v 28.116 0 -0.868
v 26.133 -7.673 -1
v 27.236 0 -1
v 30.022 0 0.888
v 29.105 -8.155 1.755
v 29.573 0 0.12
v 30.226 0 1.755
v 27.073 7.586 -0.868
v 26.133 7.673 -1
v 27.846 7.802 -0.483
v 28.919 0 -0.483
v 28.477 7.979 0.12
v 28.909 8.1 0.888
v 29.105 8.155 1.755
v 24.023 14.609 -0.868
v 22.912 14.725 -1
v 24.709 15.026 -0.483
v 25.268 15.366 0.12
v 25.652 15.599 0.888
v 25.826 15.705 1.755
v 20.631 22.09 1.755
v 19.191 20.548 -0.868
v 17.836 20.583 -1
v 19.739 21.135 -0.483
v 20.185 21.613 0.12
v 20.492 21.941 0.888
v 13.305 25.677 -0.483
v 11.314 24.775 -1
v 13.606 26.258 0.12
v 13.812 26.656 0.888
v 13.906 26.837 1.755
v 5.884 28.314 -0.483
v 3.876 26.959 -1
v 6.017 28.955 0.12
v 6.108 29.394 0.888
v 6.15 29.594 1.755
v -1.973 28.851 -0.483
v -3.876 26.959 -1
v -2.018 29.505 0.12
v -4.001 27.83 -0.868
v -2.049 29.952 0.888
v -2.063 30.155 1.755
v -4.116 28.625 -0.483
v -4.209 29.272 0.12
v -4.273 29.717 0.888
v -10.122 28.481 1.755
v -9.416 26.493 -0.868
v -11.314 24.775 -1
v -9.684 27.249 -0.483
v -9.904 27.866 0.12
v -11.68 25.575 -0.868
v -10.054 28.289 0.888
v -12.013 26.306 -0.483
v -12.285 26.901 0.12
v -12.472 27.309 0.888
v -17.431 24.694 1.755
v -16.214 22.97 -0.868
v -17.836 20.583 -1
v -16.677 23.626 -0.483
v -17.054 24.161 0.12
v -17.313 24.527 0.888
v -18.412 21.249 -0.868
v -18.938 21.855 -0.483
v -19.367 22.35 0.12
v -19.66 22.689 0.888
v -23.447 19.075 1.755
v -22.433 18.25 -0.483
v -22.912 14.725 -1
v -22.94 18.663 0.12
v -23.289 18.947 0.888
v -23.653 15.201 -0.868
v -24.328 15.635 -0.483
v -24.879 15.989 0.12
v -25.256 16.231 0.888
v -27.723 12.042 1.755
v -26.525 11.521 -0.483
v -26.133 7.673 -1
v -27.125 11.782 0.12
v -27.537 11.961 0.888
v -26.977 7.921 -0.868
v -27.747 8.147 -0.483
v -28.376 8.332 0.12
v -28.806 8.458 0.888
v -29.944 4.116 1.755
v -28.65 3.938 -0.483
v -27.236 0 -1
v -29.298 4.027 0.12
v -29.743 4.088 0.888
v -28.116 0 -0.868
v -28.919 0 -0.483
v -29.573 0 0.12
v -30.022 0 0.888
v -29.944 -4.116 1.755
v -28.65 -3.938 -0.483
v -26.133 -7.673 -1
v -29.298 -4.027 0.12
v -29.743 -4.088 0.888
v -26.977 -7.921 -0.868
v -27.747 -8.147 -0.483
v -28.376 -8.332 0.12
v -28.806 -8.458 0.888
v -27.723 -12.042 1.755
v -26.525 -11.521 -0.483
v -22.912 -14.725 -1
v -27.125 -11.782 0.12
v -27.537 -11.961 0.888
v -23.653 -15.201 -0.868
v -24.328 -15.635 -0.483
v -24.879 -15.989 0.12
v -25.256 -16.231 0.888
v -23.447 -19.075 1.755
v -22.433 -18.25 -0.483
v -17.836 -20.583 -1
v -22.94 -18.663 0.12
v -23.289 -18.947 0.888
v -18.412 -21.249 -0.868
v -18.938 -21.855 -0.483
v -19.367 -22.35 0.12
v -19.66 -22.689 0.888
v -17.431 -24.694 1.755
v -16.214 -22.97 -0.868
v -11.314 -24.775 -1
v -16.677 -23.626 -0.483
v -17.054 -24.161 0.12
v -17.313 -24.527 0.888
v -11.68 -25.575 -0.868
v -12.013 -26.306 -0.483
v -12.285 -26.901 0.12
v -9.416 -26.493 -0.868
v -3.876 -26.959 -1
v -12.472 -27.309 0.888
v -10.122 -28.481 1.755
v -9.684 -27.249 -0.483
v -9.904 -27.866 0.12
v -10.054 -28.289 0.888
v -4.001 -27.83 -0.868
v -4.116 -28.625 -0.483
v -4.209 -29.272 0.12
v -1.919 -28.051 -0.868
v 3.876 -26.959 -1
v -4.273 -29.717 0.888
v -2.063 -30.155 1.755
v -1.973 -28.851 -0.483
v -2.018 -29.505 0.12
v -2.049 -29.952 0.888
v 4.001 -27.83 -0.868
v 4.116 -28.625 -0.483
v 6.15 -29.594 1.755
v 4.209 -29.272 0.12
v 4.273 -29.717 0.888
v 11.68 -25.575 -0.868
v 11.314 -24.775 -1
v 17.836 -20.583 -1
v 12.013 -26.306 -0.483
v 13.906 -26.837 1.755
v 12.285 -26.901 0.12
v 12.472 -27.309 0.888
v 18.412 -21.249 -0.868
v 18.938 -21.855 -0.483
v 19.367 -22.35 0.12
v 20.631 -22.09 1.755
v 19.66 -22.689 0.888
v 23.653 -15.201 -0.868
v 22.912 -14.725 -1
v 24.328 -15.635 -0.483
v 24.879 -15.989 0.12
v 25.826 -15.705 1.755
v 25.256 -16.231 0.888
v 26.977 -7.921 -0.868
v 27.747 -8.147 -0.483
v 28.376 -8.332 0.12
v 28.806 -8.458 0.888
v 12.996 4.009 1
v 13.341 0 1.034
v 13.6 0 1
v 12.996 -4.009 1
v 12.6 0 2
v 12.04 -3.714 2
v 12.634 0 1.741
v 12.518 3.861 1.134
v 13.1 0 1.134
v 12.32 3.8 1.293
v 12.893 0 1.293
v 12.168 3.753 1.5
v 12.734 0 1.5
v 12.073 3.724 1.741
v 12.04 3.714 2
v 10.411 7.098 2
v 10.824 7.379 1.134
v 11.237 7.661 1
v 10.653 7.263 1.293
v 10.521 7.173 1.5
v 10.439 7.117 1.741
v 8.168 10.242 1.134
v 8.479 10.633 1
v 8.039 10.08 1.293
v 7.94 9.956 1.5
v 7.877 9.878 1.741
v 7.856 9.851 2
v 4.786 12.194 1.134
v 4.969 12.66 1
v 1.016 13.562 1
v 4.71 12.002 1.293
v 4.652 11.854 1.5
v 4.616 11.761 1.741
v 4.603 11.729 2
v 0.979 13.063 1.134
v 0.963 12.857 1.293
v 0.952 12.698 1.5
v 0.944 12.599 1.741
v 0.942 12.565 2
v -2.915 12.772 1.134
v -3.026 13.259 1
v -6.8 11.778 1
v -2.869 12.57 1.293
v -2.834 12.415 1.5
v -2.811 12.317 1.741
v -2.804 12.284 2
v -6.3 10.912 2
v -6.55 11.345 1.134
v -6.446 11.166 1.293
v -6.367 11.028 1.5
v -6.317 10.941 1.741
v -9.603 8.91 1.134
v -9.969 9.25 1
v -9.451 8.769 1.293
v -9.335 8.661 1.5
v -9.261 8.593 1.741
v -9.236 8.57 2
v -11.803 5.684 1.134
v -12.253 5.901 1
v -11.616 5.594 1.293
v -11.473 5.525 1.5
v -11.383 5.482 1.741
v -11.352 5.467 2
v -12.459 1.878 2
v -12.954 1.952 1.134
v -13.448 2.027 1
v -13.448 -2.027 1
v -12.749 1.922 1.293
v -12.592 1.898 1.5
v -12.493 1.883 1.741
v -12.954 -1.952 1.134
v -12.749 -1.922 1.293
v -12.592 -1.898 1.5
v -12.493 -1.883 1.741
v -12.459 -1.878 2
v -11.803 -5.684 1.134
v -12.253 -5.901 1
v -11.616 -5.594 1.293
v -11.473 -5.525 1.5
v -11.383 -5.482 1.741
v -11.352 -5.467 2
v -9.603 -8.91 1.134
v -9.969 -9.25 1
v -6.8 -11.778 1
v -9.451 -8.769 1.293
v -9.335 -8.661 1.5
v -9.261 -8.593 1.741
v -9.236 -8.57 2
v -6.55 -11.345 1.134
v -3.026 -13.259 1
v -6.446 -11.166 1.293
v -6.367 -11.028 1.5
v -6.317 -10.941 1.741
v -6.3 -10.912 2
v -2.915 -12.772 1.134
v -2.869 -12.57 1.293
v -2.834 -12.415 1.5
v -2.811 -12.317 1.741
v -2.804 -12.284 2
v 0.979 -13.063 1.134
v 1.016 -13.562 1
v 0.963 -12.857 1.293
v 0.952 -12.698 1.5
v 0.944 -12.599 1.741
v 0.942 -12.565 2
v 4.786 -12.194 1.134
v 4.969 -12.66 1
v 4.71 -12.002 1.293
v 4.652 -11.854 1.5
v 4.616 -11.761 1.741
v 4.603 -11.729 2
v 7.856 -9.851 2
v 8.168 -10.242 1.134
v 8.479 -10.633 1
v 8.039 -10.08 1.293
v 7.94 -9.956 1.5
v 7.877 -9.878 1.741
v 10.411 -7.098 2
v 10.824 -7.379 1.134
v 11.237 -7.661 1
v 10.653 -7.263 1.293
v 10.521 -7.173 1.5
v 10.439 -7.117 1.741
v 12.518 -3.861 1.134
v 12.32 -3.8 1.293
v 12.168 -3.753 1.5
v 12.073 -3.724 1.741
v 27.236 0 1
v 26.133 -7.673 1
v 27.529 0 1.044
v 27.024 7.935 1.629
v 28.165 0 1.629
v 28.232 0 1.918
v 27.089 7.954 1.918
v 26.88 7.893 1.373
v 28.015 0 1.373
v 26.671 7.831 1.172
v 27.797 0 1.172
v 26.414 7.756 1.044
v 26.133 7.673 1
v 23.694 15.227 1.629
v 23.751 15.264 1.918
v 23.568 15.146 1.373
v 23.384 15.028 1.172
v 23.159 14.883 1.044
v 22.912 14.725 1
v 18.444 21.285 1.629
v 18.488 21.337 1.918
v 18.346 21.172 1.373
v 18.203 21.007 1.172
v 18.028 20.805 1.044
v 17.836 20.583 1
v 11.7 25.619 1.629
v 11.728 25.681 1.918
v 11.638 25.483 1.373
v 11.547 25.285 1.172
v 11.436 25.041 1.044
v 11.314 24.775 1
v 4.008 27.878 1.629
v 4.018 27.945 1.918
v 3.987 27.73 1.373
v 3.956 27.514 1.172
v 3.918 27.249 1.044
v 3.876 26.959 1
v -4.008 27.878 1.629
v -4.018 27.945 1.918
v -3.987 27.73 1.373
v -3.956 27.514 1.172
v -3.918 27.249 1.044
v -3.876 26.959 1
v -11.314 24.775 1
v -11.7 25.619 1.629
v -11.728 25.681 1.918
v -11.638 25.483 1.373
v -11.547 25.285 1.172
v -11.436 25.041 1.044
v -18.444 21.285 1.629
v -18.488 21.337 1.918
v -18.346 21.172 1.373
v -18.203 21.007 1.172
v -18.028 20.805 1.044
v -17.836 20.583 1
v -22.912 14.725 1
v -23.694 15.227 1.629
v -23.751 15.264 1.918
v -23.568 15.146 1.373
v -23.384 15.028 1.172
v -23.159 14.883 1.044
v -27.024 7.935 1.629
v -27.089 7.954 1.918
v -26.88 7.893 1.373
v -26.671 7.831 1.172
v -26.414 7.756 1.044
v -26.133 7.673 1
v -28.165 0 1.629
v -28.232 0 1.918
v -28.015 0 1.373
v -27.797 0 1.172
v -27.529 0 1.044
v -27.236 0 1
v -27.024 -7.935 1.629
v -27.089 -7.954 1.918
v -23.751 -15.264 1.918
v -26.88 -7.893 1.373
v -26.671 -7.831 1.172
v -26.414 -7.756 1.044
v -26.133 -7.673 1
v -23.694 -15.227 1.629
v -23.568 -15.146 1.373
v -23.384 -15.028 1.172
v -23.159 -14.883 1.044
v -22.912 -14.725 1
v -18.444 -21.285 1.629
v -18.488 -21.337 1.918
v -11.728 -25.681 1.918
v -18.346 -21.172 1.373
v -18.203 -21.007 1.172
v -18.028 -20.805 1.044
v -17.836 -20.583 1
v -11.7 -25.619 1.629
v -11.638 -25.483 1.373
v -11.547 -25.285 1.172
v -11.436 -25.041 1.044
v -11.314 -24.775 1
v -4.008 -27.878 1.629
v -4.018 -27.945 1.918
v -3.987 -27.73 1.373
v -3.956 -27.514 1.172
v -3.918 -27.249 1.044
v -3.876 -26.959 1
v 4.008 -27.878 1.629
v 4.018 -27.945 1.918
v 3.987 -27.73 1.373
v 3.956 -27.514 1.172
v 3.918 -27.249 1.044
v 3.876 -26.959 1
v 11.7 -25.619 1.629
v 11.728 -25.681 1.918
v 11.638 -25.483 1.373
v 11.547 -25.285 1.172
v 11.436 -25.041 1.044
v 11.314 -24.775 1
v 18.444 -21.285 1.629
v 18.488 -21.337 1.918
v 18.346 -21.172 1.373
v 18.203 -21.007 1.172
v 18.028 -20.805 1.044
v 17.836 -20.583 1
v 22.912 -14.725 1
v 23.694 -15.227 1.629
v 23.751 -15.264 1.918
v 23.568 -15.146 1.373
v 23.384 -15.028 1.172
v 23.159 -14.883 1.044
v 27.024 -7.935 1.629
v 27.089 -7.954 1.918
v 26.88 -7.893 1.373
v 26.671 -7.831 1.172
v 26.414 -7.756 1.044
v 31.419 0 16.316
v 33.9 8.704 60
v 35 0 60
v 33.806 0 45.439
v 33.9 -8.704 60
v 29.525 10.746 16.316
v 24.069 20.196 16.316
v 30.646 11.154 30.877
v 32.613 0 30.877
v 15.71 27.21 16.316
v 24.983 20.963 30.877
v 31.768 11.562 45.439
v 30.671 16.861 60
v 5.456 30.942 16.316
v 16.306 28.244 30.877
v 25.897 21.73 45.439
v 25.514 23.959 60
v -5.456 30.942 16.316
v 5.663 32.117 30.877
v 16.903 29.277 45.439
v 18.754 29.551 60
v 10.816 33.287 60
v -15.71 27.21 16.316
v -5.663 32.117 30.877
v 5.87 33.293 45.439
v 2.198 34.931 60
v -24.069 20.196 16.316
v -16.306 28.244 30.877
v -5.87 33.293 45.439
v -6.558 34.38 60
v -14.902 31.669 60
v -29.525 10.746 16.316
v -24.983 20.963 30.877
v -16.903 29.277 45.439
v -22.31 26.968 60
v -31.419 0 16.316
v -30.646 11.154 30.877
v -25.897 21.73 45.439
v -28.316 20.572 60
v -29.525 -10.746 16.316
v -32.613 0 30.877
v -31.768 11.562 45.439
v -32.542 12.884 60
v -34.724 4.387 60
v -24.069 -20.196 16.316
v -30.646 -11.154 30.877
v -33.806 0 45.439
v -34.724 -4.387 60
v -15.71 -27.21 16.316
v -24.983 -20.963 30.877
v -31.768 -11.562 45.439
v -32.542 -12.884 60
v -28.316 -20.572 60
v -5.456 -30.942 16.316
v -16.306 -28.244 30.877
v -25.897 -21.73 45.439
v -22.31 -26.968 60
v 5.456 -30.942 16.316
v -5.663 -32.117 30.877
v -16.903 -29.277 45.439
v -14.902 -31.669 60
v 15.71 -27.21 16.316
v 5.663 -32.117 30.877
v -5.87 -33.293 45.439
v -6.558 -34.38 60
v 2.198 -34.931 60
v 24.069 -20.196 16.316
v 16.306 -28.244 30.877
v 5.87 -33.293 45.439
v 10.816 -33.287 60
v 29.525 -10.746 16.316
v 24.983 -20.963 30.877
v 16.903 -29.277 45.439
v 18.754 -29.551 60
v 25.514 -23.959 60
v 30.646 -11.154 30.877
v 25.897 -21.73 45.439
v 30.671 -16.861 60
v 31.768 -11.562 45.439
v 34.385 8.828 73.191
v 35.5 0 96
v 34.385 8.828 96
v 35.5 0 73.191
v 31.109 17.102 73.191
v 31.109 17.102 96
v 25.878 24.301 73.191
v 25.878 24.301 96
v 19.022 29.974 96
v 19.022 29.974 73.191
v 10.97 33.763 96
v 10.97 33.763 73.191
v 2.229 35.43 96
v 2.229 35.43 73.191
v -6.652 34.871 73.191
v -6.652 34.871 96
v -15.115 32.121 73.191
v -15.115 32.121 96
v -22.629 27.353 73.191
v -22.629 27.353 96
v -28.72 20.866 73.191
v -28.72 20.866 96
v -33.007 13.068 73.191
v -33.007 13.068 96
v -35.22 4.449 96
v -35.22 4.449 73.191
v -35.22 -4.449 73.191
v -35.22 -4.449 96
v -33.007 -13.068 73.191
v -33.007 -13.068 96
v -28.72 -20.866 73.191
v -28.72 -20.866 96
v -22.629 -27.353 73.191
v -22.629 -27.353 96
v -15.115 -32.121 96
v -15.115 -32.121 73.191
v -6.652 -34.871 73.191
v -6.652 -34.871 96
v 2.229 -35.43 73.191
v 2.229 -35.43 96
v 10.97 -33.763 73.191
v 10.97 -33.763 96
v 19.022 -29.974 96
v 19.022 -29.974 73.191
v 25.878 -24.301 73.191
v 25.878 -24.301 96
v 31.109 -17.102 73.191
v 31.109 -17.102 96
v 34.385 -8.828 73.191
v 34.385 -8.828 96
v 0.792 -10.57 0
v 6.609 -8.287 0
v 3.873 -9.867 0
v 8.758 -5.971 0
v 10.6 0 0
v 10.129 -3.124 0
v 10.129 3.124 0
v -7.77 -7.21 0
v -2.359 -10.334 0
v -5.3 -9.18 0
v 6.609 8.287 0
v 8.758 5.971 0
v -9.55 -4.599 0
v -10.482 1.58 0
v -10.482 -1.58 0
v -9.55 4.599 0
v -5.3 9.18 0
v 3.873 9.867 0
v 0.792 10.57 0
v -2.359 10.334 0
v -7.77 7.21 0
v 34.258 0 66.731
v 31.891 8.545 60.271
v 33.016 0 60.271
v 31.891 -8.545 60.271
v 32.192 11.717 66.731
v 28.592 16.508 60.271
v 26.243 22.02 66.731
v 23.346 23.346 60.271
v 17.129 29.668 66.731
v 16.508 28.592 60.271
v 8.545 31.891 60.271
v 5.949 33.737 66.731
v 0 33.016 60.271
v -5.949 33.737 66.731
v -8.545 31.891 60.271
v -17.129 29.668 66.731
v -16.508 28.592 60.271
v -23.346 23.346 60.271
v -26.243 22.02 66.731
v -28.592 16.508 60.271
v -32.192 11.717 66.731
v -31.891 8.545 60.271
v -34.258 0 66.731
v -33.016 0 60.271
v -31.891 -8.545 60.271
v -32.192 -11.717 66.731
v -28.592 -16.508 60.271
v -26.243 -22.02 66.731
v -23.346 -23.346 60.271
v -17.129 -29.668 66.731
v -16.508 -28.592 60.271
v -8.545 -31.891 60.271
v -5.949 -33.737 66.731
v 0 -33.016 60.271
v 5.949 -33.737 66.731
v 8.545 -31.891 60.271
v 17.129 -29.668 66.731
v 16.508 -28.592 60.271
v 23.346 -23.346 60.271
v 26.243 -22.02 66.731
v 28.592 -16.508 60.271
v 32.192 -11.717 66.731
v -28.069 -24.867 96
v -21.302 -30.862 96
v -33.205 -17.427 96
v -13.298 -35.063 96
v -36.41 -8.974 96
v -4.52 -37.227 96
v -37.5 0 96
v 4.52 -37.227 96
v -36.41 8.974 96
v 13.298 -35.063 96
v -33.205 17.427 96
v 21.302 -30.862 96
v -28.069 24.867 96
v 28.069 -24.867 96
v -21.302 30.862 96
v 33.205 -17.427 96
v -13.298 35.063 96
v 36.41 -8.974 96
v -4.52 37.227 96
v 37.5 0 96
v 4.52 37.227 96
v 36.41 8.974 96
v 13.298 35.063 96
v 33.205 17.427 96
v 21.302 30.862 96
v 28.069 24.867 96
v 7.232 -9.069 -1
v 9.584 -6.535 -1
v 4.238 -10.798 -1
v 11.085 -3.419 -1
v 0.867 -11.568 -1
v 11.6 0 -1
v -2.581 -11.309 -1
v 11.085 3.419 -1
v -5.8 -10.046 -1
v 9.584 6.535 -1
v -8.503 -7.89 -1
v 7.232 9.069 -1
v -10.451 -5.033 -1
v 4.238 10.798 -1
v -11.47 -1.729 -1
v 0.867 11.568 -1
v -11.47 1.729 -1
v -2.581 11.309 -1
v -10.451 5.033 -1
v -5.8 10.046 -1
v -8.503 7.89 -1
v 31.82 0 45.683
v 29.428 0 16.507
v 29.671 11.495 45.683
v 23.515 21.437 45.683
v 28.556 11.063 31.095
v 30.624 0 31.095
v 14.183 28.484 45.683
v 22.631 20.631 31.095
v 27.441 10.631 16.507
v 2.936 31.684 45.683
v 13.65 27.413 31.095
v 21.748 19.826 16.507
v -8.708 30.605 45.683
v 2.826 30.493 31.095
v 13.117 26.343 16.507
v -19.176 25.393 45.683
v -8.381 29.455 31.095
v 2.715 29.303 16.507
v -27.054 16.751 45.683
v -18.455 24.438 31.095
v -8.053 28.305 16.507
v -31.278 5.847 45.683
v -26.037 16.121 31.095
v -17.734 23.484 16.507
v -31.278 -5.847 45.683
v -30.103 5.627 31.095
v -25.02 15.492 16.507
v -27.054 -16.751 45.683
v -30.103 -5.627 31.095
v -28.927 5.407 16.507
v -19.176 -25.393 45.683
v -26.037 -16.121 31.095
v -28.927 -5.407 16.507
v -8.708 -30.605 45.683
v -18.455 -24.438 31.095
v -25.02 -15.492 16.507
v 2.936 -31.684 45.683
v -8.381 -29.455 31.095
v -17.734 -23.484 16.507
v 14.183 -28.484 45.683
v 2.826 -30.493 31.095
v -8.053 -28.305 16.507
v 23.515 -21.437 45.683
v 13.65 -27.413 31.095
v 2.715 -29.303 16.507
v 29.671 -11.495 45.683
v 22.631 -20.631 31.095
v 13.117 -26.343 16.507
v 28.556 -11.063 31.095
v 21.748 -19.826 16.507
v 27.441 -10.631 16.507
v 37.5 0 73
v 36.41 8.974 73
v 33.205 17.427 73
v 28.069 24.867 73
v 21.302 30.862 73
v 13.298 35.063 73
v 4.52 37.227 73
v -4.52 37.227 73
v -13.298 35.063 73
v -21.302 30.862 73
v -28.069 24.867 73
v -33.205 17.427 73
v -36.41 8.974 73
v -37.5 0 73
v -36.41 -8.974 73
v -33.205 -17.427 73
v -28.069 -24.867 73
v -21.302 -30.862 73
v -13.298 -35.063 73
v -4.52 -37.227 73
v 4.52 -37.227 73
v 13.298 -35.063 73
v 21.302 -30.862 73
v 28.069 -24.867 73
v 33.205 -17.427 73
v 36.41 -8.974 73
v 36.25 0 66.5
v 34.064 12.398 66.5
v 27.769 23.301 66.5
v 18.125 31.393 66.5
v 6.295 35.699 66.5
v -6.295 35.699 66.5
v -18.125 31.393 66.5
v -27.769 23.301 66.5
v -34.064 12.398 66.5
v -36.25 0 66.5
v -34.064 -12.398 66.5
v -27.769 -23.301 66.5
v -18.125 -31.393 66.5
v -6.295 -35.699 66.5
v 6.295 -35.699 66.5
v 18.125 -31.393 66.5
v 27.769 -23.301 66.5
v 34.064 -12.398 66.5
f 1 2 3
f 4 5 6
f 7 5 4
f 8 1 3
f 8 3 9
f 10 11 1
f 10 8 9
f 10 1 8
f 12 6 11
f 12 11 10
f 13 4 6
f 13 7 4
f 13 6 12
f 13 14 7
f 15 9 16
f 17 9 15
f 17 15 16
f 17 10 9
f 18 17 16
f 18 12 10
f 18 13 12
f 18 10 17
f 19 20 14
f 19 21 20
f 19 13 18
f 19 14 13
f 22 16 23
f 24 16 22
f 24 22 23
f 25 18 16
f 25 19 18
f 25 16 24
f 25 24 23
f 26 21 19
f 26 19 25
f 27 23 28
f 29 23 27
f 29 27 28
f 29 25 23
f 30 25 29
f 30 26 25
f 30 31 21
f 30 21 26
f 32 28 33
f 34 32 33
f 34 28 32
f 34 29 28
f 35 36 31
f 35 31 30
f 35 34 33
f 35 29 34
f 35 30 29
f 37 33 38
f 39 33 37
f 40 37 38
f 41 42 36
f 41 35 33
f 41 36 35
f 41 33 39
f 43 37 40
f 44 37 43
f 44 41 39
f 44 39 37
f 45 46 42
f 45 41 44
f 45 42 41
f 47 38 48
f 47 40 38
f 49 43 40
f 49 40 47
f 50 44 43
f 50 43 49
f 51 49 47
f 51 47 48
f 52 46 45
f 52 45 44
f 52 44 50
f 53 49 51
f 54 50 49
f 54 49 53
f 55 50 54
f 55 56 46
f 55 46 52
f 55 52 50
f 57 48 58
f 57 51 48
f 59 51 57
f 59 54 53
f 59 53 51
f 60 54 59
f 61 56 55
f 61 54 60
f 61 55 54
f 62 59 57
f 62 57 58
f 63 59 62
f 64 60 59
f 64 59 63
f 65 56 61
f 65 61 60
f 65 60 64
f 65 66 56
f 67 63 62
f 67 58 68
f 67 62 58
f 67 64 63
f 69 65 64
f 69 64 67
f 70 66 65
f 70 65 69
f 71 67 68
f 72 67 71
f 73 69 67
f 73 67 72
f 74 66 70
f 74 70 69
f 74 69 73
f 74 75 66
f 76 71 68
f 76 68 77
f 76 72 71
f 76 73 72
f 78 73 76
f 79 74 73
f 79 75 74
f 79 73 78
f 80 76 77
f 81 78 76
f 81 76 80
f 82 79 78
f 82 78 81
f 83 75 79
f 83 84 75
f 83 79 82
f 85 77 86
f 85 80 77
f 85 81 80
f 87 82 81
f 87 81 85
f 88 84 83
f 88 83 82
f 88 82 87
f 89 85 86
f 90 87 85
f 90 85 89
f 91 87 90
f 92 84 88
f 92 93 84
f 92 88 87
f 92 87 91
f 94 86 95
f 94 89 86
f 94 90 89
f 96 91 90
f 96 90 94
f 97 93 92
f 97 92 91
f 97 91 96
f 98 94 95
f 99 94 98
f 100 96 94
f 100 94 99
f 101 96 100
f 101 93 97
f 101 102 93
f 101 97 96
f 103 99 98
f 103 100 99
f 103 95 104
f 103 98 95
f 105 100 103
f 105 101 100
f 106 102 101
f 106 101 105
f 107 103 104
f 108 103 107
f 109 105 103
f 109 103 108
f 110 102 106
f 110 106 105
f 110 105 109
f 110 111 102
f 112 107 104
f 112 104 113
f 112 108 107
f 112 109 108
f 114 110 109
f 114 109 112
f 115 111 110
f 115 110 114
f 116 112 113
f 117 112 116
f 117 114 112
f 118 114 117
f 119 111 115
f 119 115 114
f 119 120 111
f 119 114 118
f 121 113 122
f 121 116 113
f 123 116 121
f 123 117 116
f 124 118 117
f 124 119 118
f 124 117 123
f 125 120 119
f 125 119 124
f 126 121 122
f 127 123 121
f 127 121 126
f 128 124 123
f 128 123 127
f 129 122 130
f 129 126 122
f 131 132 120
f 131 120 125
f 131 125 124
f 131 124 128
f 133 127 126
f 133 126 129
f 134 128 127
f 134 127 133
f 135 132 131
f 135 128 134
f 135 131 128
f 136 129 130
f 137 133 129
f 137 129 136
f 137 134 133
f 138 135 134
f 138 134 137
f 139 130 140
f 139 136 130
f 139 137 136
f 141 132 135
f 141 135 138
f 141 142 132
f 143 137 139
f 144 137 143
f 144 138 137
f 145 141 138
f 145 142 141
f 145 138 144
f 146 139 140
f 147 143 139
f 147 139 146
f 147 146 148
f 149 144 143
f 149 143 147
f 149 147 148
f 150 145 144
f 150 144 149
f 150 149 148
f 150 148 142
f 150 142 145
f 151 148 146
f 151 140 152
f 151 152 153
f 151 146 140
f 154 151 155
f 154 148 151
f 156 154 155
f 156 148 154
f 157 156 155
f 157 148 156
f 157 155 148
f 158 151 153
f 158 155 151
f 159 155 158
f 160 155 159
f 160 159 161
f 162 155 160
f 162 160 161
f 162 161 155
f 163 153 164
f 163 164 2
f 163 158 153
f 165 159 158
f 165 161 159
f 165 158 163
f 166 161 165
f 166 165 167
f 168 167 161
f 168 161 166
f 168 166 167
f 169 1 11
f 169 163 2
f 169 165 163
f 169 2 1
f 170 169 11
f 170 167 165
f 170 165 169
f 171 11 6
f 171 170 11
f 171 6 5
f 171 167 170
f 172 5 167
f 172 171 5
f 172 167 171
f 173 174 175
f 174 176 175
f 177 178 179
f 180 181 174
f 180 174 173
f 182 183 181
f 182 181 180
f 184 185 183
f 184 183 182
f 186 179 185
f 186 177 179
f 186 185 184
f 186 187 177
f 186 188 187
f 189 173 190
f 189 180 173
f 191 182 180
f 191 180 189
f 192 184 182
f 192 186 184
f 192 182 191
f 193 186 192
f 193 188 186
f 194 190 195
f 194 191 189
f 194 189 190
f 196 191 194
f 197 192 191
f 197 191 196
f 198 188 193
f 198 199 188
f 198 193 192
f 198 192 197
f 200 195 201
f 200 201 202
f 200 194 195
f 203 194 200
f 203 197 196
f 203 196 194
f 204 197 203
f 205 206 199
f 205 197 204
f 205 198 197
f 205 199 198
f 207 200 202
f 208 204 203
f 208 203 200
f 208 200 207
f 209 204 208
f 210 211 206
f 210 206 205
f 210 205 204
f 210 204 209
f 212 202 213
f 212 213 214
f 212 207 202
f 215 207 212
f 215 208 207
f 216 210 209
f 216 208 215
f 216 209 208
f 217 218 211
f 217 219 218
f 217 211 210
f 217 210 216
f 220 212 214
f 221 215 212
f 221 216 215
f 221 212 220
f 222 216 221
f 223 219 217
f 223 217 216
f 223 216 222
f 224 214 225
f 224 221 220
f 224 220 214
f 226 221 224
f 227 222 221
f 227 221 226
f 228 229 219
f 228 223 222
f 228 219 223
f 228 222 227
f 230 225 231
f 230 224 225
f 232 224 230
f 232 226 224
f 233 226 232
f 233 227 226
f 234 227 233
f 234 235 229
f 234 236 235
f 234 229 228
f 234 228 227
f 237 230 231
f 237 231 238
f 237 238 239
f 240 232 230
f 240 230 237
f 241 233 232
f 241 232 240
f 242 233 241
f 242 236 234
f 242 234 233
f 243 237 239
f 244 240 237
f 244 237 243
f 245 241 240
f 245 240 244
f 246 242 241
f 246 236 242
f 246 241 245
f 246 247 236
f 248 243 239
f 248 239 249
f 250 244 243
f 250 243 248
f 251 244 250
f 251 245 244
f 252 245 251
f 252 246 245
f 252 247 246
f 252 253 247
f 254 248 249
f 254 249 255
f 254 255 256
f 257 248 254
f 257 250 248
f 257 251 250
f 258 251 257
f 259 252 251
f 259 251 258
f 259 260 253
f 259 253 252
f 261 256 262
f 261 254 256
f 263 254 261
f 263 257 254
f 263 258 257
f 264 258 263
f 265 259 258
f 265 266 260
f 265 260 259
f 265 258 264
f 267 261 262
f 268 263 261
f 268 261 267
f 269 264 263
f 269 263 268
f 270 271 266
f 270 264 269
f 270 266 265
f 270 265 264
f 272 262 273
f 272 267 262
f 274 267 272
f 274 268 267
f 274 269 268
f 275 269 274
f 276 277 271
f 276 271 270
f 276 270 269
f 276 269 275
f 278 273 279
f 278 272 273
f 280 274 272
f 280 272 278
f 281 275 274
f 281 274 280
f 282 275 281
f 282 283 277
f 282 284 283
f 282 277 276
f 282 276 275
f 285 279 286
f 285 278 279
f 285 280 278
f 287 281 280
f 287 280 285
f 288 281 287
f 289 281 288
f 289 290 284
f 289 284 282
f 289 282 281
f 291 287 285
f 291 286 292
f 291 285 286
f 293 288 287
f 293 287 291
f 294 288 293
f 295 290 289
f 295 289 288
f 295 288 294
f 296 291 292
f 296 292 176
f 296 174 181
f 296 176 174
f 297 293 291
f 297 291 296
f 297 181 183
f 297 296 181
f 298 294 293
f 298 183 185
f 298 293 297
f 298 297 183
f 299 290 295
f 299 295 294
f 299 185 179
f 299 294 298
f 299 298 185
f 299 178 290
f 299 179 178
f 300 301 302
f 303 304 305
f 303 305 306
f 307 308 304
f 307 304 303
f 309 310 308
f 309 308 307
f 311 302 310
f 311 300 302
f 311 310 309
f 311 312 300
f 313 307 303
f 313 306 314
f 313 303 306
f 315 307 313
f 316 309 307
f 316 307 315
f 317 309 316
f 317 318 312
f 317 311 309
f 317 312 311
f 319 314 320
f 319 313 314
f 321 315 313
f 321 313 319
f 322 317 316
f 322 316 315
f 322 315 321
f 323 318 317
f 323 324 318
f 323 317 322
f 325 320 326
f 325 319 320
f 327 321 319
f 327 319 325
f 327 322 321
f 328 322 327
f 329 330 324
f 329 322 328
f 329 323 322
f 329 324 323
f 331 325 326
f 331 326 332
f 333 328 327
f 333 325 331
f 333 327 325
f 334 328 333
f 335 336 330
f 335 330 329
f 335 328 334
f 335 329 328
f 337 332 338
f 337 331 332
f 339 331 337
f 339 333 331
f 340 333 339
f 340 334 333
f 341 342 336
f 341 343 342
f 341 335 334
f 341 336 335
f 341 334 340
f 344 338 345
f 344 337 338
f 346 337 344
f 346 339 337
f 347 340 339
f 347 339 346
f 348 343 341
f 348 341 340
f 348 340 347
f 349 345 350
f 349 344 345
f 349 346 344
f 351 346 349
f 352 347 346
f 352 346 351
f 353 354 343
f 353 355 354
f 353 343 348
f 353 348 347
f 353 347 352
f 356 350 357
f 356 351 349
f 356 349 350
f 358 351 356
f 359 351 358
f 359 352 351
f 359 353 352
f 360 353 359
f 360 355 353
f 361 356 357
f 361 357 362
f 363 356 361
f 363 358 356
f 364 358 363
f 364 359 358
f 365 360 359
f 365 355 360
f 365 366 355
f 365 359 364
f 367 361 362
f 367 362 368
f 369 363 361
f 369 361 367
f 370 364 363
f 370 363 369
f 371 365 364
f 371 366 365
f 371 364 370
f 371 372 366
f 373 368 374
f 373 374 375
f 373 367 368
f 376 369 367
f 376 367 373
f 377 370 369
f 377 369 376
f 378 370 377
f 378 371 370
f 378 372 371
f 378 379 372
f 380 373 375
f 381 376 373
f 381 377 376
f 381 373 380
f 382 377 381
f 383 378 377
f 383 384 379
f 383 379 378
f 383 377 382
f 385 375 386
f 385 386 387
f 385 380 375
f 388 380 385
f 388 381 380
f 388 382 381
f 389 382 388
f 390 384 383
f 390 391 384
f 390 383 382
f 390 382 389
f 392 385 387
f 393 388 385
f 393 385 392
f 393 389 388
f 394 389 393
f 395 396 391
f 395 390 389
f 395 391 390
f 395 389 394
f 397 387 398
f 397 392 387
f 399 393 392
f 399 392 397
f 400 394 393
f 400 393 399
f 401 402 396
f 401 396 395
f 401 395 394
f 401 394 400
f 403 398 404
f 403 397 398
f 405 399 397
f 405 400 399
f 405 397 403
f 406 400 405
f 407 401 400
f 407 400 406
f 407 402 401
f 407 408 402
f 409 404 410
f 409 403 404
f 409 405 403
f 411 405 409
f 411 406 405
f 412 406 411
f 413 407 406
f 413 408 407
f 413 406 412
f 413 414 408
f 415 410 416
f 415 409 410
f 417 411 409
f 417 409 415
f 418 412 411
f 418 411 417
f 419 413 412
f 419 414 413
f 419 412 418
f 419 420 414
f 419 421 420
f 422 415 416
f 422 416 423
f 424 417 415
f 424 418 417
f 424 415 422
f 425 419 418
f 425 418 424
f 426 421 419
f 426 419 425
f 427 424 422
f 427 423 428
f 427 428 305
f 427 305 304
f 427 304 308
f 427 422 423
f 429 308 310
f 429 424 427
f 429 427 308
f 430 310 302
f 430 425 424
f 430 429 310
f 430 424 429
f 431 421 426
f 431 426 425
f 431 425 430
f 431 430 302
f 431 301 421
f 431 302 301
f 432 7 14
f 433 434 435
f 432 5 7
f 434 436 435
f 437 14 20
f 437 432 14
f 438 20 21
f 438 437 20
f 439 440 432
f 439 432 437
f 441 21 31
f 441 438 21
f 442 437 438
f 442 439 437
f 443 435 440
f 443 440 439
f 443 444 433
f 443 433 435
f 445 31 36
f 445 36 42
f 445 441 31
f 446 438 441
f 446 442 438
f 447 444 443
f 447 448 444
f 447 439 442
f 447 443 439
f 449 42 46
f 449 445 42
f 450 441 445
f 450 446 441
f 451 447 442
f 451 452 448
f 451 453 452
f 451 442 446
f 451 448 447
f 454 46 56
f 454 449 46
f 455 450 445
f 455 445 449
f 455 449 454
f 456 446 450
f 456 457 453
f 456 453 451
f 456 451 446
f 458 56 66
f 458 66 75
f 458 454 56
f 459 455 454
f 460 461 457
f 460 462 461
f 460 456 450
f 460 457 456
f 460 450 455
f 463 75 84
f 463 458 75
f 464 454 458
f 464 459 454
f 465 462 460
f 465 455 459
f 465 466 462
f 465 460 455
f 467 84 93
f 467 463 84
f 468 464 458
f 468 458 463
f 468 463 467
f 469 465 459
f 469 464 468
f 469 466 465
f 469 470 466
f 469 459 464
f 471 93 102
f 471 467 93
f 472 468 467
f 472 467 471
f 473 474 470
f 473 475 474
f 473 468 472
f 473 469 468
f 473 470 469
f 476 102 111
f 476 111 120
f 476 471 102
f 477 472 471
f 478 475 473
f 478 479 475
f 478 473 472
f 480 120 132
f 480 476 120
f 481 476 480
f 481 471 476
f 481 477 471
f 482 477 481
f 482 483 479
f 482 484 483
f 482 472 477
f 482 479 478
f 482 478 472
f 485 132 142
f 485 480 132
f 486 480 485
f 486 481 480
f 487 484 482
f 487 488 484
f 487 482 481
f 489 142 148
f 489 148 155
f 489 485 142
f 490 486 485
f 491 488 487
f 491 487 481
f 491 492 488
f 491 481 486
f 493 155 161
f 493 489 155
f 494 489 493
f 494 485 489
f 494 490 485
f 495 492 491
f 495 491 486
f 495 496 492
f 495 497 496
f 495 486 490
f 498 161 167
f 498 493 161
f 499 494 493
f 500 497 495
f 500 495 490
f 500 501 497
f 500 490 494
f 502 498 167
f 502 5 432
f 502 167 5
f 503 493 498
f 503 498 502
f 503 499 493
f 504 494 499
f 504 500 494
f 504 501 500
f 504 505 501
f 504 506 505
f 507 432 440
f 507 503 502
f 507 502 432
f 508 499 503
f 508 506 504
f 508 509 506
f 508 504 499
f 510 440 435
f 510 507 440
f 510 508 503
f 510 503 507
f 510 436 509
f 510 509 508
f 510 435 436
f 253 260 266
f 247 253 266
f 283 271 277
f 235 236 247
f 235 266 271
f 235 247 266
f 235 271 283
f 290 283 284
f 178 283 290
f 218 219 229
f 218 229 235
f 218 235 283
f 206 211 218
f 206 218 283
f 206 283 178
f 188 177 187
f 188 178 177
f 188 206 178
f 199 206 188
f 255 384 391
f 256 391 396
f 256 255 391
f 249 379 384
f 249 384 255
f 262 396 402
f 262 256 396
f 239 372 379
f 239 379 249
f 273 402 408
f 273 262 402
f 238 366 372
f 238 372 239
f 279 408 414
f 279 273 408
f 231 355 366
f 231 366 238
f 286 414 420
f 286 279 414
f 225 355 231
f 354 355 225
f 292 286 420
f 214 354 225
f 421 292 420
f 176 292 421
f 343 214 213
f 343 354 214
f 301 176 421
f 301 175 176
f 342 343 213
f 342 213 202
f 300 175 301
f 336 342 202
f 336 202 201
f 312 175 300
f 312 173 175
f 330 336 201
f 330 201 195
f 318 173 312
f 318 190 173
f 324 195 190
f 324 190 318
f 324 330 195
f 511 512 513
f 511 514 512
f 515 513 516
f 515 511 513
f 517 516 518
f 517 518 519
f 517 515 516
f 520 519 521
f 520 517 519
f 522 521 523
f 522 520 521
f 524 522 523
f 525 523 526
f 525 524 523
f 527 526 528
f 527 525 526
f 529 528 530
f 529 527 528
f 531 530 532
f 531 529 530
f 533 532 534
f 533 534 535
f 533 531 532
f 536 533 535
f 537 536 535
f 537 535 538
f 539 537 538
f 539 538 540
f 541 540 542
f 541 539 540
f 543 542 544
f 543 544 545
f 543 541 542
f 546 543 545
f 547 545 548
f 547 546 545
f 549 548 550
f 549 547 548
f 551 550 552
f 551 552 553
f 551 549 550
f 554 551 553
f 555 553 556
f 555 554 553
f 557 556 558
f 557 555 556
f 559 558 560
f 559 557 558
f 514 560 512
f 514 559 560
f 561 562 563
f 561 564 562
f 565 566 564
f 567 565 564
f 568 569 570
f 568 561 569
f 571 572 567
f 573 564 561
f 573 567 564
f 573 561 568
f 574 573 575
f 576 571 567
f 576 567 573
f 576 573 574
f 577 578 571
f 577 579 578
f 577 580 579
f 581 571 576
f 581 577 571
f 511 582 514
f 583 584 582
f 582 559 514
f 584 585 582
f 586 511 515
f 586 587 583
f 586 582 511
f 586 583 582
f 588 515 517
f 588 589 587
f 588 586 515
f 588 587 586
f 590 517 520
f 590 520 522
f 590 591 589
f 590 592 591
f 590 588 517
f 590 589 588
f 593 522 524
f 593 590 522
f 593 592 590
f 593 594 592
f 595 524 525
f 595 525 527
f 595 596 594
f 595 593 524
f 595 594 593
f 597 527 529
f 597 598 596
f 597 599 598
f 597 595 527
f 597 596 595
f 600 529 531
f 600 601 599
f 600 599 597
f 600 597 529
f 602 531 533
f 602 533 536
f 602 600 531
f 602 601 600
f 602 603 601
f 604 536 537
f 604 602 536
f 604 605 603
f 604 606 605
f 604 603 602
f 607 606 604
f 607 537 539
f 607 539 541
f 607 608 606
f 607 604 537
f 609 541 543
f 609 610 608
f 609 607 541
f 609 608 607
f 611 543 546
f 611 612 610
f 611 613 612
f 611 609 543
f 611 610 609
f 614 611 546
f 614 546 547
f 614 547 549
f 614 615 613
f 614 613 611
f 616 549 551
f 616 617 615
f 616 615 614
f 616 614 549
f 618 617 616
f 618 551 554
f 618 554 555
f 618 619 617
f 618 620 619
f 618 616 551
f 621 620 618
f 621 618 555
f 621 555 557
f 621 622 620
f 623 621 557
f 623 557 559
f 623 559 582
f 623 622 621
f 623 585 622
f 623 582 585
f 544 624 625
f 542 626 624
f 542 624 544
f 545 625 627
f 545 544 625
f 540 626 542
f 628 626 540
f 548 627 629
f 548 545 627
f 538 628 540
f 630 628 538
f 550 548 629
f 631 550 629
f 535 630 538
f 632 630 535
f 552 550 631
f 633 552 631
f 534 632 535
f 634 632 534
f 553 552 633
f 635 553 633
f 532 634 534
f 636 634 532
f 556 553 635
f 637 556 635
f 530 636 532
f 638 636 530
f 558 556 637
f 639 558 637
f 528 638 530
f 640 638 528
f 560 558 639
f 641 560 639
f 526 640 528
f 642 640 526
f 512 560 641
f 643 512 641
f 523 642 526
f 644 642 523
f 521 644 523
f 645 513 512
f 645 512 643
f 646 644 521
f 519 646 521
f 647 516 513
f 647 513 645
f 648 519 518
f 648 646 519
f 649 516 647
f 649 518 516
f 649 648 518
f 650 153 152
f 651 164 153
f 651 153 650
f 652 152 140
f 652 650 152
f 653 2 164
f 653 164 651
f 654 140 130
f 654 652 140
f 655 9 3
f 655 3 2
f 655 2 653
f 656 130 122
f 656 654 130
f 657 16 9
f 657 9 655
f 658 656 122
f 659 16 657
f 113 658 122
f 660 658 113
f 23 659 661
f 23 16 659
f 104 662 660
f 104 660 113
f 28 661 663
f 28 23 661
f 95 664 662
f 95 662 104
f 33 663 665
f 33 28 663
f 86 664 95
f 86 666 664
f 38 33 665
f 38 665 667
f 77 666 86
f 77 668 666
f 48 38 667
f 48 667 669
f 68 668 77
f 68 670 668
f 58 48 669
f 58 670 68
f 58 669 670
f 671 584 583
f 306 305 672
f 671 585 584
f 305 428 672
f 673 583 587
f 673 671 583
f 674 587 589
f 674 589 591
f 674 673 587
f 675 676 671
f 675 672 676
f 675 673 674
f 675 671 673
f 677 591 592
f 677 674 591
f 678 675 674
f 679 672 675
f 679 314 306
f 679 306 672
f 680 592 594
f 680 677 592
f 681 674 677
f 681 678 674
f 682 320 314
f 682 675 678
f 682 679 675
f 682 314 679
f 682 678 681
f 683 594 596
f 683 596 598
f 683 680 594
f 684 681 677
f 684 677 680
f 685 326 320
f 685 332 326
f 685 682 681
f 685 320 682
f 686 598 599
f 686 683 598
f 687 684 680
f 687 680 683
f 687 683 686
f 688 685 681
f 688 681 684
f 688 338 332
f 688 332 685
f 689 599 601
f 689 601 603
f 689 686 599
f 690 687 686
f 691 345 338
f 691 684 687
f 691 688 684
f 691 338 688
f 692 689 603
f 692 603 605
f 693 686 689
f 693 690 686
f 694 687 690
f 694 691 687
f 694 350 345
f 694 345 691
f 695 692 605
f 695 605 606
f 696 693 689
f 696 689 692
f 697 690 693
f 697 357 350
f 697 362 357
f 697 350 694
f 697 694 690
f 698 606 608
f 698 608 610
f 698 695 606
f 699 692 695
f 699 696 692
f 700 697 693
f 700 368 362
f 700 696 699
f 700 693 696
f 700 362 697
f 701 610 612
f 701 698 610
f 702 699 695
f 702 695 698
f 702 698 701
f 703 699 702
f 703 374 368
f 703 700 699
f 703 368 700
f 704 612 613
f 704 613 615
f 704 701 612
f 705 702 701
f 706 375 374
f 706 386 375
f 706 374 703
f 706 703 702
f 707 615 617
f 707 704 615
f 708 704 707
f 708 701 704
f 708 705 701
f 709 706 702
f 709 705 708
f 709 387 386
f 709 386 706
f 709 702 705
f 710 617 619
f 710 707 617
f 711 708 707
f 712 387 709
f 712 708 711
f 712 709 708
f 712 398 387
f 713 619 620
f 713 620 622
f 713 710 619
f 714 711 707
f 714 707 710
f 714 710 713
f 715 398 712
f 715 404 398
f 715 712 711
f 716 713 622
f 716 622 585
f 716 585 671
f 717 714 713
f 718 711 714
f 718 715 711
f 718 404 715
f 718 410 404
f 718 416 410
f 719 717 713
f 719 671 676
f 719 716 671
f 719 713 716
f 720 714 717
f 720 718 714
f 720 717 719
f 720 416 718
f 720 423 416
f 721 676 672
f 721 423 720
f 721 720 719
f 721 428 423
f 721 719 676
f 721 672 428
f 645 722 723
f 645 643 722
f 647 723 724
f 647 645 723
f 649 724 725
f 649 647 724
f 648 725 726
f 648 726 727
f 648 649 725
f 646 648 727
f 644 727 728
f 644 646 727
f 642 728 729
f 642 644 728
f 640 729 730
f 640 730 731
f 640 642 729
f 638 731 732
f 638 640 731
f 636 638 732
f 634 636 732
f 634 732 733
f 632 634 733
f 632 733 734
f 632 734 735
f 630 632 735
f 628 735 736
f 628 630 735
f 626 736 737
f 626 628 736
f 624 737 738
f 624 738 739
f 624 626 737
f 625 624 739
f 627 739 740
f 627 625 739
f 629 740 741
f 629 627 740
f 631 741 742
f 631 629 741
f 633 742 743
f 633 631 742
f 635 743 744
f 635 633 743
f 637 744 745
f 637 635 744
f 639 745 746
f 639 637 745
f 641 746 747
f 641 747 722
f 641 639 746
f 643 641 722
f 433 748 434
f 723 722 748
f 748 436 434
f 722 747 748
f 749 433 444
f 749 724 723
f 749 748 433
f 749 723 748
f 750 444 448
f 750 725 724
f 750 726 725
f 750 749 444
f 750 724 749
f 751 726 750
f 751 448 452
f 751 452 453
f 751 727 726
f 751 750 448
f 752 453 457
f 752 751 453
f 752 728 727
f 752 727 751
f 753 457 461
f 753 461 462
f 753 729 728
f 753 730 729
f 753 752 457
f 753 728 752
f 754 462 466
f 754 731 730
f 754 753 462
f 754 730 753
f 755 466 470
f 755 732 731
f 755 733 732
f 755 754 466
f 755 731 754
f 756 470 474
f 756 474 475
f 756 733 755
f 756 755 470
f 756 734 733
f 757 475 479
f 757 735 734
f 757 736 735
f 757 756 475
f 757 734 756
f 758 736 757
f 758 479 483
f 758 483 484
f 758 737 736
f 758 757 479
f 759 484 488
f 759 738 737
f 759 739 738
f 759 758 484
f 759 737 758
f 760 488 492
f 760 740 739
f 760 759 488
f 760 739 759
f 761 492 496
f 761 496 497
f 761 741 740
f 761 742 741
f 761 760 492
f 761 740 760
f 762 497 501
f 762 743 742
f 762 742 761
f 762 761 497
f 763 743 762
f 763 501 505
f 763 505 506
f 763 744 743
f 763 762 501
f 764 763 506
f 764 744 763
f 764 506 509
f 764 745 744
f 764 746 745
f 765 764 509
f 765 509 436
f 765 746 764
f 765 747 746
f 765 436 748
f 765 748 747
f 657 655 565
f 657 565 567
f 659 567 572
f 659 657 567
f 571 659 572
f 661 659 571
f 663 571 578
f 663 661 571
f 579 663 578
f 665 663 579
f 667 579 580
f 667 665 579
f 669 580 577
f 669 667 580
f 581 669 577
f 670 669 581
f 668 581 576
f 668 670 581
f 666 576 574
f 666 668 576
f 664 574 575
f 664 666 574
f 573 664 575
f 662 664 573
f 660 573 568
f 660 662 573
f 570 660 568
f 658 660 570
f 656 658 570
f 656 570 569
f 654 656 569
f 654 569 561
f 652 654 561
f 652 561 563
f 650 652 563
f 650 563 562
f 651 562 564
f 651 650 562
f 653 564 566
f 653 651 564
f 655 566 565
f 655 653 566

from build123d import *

# Parameters (mm, degrees)
F2_SIZE = 0.99999
F3_R    = 3
F4_R    = 1
F5_R    = 0.99999


# Not quite as in the source:
# - a fillet or chamfer is up to 0.001 mm smaller than in the source, because OpenCascade refuses the exact size


with BuildPart() as f1:
    # F0 (on Front) → F1 (revolve)
    with BuildSketch(Plane.XZ):
        Polygon((0, 2), (0, 0), (10.6, 0), (10.6, -1), (30, -1), (35, 60), (37.5, 73), (37.5, 96), (35.5, 96), (35.5, 73.1905618359), (33.0155331198, 60.2713340591), (28.1572270494, 1), (12.6, 1), (12.6, 2), align=None)
    revolve(axis=Axis((0, 0, 49), (0, 0, 1)))

    # F2 (size 1 in the source; OpenCascade refuses exactly that, so slightly less here)
    f2_edges = [f1.edges().sort_by_distance(p)[0] for p in [
        (-10.6, 0, -1),
    ]]
    chamfer(f2_edges, length=F2_SIZE)

    # F3
    f3_edges = [f1.edges().sort_by_distance(p)[0] for p in [
        (-30, 0, -1),
    ]]
    fillet(f3_edges, radius=F3_R)

    # F4
    f4_edges = [f1.edges().sort_by_distance(p)[0] for p in [
        (-28.157227, 0, 1),
    ]]
    fillet(f4_edges, radius=F4_R)

    # F5 (radius 1 in the source; OpenCascade refuses exactly that, so slightly less here)
    f5_edges = [f1.edges().sort_by_distance(p)[0] for p in [
        (-12.6, 0, 1),
    ]]
    fillet(f5_edges, radius=F5_R)


solid = f1.part
